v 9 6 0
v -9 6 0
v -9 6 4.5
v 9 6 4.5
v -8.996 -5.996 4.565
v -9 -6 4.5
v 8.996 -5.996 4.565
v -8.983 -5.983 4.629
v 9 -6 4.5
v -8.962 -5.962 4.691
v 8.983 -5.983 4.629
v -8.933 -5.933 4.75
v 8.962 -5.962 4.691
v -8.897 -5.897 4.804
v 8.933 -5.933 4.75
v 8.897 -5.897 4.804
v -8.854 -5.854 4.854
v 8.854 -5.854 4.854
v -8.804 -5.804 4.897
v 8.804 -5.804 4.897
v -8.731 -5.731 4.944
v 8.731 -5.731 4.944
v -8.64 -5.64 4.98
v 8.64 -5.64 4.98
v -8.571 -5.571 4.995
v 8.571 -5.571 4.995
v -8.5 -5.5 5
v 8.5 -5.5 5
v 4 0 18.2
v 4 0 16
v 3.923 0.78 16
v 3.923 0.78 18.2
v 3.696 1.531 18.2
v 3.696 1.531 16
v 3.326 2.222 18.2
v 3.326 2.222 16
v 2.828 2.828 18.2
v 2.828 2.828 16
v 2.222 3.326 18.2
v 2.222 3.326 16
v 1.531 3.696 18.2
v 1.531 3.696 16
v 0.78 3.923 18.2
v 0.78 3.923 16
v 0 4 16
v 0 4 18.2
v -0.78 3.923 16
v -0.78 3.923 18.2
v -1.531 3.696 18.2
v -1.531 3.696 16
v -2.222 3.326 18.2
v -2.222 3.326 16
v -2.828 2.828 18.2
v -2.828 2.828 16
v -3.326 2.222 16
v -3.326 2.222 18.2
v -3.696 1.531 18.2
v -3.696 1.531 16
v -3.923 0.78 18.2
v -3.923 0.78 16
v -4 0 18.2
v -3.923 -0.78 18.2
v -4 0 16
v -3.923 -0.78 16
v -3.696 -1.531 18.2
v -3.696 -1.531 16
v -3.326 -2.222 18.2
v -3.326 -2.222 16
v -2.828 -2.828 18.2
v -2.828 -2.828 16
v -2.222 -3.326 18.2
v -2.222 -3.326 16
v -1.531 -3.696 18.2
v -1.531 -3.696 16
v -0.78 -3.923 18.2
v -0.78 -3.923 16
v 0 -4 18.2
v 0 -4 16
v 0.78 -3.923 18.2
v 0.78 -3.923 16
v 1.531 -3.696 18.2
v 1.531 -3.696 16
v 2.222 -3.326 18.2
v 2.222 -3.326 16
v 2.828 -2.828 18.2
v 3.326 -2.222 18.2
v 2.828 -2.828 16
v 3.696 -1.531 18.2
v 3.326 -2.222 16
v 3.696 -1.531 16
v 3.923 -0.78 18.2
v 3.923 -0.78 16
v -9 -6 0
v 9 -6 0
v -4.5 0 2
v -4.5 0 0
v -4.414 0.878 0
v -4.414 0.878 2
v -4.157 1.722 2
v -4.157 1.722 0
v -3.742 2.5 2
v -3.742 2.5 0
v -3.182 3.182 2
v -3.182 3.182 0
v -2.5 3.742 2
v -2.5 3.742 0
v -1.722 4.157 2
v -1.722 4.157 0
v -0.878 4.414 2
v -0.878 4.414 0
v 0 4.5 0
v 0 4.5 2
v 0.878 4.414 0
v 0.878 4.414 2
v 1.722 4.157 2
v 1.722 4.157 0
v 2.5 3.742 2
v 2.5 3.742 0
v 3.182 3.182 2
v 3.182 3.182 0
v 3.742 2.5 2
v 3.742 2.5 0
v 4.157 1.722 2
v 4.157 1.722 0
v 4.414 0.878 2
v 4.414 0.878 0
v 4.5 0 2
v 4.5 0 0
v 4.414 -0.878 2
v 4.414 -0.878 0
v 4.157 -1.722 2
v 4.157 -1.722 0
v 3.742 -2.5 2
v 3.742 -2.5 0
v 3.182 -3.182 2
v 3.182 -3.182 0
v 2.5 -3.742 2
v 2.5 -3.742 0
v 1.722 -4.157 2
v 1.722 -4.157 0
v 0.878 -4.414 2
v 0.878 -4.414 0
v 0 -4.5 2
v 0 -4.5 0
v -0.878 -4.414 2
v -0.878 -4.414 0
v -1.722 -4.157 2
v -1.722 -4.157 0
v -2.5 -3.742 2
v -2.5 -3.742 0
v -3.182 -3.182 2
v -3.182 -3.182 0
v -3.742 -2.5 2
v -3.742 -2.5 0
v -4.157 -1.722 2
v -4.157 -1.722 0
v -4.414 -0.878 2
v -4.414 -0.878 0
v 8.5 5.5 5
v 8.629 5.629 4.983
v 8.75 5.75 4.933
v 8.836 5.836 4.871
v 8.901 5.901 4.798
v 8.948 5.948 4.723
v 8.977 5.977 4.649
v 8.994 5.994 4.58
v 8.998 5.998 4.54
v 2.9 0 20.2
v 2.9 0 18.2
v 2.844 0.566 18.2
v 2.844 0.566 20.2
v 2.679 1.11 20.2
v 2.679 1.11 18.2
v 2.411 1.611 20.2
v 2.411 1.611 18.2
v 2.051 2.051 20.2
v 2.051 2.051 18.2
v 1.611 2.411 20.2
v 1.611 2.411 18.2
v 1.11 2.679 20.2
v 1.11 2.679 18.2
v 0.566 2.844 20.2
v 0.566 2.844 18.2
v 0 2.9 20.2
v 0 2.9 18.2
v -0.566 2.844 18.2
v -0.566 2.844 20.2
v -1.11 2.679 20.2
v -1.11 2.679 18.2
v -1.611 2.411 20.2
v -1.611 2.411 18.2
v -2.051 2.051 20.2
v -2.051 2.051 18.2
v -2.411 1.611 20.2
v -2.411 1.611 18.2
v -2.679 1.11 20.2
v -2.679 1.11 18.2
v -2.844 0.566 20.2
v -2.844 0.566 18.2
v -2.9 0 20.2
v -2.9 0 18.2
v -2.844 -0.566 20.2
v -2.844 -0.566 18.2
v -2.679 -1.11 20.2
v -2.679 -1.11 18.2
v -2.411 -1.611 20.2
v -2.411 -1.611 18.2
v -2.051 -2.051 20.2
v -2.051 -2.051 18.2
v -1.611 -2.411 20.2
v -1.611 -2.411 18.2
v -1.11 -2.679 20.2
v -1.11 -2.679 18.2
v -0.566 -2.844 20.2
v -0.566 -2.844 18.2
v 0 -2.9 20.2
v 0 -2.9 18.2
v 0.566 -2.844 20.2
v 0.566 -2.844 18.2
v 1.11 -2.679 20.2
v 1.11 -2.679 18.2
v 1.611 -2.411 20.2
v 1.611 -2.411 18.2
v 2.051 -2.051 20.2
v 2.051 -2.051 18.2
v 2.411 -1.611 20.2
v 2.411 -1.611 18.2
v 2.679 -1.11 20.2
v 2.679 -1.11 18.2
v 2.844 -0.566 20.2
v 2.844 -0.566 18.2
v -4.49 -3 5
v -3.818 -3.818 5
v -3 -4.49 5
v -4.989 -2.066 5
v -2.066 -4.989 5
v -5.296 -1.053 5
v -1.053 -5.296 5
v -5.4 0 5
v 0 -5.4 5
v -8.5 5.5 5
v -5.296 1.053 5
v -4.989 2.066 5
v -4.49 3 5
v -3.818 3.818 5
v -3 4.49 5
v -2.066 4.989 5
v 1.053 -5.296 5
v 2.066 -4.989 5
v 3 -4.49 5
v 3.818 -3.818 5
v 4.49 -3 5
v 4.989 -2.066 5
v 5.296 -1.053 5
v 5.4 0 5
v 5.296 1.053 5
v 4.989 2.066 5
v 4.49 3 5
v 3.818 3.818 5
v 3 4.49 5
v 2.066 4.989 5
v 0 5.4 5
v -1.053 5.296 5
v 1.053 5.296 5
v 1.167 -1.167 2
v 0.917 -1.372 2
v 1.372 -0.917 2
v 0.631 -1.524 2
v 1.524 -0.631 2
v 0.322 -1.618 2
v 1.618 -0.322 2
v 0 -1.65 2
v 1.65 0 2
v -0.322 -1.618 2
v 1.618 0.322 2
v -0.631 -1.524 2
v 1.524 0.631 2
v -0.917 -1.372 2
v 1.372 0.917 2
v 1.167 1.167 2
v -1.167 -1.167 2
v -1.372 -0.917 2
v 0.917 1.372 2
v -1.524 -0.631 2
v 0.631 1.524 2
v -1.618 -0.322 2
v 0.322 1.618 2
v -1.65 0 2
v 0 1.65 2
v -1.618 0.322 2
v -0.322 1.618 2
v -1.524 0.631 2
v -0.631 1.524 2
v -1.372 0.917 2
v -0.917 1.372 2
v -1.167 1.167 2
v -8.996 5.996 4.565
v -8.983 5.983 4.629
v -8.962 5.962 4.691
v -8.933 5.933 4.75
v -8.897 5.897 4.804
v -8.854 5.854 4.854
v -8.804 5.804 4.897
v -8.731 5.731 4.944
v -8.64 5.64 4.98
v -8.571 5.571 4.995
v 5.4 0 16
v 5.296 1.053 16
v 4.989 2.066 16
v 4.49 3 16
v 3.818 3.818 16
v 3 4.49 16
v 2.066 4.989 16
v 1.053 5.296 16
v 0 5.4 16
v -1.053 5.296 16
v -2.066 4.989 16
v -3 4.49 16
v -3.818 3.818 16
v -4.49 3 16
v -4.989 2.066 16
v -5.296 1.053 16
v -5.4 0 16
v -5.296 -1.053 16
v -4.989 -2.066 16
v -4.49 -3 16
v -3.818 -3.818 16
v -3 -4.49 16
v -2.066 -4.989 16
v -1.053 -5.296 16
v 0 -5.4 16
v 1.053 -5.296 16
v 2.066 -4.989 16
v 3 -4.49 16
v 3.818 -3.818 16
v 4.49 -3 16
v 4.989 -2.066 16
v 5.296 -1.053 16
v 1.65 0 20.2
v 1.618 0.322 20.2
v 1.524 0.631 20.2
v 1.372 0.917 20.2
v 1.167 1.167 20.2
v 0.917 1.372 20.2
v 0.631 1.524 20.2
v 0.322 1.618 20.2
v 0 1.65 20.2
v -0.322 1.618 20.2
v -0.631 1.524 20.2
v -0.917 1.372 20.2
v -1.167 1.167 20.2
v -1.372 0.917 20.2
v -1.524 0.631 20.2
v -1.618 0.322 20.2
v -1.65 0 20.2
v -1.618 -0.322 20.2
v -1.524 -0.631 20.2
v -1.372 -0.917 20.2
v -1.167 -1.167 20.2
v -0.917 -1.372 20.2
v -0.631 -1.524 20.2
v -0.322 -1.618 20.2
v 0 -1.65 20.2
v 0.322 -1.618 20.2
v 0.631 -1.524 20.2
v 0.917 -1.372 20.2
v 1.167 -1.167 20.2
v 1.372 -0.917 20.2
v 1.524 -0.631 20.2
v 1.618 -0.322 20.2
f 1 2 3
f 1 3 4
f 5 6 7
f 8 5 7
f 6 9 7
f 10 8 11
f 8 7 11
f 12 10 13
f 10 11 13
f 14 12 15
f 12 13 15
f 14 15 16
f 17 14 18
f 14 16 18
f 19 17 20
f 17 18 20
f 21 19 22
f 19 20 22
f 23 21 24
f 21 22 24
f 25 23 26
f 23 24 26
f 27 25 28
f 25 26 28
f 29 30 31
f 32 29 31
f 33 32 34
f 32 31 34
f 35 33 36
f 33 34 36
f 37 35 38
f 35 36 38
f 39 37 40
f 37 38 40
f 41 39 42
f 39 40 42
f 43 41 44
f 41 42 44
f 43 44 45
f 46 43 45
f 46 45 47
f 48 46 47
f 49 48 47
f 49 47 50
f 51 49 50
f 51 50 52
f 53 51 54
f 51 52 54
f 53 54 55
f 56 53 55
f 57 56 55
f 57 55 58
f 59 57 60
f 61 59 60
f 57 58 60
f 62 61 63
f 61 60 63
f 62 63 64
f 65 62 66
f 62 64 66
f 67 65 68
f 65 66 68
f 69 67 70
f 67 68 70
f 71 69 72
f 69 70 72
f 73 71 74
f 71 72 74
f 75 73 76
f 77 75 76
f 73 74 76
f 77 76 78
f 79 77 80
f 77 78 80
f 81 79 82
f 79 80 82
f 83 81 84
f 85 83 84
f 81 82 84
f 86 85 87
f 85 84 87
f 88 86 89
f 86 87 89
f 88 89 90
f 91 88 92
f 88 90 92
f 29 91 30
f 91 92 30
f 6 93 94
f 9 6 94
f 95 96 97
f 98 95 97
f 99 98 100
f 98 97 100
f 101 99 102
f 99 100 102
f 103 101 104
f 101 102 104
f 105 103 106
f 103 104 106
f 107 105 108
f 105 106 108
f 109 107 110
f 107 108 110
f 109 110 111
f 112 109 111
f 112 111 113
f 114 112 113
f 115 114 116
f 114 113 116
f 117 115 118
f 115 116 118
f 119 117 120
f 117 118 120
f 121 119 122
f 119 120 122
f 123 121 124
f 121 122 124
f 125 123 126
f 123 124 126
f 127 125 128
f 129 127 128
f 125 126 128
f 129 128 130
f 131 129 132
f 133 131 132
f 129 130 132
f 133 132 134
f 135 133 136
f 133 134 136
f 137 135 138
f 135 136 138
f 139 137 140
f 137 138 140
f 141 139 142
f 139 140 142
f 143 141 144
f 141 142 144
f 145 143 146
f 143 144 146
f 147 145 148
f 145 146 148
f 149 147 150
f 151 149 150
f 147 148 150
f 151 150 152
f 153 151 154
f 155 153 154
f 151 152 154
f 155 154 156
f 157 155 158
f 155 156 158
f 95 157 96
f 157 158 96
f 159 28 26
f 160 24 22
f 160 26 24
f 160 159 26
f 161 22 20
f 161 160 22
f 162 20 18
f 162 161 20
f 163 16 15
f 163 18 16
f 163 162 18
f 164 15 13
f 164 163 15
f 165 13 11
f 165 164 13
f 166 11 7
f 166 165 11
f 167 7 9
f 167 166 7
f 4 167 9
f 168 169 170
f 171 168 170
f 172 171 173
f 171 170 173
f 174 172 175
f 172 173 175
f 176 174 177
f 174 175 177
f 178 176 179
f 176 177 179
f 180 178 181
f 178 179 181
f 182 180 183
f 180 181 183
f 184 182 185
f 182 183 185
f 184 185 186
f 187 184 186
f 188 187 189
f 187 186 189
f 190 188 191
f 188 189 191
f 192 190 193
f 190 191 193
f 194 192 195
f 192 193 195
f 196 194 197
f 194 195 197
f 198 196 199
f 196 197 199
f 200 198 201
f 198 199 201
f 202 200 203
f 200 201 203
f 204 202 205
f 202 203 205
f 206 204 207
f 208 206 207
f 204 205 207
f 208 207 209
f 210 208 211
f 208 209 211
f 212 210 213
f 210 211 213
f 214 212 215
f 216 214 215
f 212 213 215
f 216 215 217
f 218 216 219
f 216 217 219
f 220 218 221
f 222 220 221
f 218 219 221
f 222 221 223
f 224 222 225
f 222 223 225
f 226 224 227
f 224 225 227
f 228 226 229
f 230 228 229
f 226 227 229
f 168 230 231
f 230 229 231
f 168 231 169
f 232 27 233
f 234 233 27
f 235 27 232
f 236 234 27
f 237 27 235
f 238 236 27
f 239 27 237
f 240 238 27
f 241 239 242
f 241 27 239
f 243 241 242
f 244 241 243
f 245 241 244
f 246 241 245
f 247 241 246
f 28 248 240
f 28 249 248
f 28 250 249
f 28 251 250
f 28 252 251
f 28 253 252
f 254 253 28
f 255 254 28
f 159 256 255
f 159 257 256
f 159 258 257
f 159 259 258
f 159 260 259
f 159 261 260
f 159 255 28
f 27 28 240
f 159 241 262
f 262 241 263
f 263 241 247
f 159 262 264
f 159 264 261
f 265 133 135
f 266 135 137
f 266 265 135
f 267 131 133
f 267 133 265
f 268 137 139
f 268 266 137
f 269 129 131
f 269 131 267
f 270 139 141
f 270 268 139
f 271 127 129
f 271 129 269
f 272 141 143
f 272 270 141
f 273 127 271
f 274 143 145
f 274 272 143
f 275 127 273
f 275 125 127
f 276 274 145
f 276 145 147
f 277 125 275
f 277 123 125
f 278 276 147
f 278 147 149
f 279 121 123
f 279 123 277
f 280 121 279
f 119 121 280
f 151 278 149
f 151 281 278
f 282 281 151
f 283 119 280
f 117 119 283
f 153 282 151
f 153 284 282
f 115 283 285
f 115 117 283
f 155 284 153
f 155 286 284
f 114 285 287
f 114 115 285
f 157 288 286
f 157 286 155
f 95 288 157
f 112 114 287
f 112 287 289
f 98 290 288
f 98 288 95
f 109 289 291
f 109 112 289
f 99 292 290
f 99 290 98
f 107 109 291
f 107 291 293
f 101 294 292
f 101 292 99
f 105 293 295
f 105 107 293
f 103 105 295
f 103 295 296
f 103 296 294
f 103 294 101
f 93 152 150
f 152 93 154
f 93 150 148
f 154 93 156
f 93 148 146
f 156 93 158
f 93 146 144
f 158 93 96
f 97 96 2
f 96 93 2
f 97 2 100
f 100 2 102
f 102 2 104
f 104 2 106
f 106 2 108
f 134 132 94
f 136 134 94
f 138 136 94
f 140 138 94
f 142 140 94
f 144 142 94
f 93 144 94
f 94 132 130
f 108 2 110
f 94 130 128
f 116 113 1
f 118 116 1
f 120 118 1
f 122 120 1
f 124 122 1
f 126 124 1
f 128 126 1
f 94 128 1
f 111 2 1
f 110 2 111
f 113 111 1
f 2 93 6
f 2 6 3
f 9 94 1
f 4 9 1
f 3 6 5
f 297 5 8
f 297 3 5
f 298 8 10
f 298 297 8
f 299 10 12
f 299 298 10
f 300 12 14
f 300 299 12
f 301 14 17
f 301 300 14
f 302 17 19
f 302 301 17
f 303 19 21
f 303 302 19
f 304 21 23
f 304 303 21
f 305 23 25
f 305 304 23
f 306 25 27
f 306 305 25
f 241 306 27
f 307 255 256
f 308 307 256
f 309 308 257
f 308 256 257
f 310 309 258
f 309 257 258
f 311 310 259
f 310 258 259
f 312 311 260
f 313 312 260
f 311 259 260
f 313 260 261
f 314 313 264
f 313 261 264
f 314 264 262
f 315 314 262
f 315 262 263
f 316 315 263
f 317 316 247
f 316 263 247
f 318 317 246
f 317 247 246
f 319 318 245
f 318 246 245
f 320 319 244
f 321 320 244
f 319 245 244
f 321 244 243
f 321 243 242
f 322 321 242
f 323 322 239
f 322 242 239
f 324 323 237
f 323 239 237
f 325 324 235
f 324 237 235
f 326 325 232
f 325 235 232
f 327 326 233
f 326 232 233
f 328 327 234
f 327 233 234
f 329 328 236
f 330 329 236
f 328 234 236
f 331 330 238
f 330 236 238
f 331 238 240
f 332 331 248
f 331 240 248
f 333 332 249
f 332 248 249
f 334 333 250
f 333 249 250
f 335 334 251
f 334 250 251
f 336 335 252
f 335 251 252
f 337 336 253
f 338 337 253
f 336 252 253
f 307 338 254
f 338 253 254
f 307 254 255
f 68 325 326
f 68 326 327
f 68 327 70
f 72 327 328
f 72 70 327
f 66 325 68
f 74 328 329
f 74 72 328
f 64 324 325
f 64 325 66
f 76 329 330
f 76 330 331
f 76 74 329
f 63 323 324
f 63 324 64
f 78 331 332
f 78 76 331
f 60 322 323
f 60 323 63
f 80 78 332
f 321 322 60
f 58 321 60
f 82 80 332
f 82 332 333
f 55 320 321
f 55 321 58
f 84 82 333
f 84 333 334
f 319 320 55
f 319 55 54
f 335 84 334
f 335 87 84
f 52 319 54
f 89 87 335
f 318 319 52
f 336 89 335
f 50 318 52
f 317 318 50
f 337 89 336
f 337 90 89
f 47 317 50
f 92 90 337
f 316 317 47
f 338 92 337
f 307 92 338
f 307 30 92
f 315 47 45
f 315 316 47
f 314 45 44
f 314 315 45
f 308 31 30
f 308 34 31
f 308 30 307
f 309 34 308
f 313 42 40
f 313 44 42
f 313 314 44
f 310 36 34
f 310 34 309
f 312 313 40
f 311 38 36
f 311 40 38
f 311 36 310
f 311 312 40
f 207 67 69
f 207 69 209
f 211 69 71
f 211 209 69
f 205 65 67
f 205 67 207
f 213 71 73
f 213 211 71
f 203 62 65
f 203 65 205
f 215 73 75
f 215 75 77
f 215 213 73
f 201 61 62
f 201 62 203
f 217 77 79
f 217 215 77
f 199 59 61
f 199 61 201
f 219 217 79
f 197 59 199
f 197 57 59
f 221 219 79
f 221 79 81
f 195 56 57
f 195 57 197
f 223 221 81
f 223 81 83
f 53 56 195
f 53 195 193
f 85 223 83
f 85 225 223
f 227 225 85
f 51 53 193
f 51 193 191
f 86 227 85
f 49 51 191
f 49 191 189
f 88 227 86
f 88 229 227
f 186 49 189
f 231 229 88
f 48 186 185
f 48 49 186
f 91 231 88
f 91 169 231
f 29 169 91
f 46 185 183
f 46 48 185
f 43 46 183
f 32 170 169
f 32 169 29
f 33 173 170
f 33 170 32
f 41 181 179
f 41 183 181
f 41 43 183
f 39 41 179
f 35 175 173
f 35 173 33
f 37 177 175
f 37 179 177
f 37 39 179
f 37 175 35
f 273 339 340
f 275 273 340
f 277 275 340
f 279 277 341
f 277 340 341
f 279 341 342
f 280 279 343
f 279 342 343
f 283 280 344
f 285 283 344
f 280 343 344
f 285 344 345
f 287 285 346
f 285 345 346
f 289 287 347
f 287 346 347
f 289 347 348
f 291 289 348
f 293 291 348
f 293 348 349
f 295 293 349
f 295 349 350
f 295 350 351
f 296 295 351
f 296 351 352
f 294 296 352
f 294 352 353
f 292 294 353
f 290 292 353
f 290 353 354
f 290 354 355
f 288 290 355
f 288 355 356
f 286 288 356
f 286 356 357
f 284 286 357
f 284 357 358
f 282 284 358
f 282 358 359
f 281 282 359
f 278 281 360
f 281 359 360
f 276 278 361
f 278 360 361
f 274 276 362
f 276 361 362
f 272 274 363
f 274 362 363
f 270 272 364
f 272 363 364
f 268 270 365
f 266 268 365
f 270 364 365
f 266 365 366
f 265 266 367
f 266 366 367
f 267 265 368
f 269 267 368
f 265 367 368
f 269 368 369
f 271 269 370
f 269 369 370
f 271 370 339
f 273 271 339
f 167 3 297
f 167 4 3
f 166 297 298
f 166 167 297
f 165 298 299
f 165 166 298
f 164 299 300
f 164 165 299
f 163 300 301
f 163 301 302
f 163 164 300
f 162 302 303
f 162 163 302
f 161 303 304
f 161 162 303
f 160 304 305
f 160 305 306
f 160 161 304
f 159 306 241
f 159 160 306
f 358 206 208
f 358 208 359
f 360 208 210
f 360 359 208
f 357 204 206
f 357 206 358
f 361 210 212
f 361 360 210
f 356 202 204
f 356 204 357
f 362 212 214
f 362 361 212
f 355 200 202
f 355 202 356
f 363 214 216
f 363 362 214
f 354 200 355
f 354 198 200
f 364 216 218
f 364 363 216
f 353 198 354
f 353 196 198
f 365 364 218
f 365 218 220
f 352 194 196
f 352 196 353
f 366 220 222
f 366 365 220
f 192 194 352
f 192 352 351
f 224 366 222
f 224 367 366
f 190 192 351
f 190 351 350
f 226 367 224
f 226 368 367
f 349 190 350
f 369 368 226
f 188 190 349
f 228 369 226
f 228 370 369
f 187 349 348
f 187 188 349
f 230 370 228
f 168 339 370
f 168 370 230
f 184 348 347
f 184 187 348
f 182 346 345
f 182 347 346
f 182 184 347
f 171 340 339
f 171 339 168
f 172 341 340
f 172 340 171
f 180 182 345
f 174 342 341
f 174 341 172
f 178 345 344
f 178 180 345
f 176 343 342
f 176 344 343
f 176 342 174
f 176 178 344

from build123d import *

# Parameters (mm, degrees)
SKETCH_1_W          = 18
SKETCH_1_H          = 12
EXTRUDE_1_DEPTH     = 5
SKETCH_2_R          = 5.4
EXTRUDE_2_DEPTH     = 11
SKETCH_3_R          = 4
EXTRUDE_3_DEPTH     = 2.2
SKETCH_4_R          = 2.9
EXTRUDE_4_DEPTH     = 2
SKETCH_5_R          = 1.65
CUT_EXTRUDE_1_DEPTH = 25
SKETCH_6_R          = 4.5
CUT_EXTRUDE_2_DEPTH = 2
FILLET_1_R          = 0.5


with BuildPart() as part:
    # 草图1 → 凸台-拉伸1 (new body)
    with BuildSketch(Plane.XY):
        Rectangle(SKETCH_1_W, SKETCH_1_H)
    extrude(amount=EXTRUDE_1_DEPTH)

    # 草图2 → 凸台-拉伸2 (add)
    with BuildSketch(Plane.XY.offset(5)):
        Circle(SKETCH_2_R)
    extrude(amount=EXTRUDE_2_DEPTH)

    # 草图3 → 凸台-拉伸3 (add)
    with BuildSketch(Plane.XY.offset(16)):
        Circle(SKETCH_3_R)
    extrude(amount=EXTRUDE_3_DEPTH)

    # 草图4 → 凸台-拉伸4 (add)
    with BuildSketch(Plane.XY.offset(18.2)):
        Circle(SKETCH_4_R)
    extrude(amount=EXTRUDE_4_DEPTH)

    # 草图5 → 切除-拉伸1 (cut)
    with BuildSketch(Plane.XY.offset(20.2)):
        Circle(SKETCH_5_R)
    extrude(amount=-CUT_EXTRUDE_1_DEPTH, mode=Mode.SUBTRACT)

    # 草图6 → 切除-拉伸2 (cut)
    with BuildSketch(Plane(origin=(0, 0, 0), x_dir=(-1, 0, 0), z_dir=(0, 0, -1))):
        Circle(SKETCH_6_R)
    extrude(amount=-CUT_EXTRUDE_2_DEPTH, mode=Mode.SUBTRACT)

    # 圆角1
    fillet_1_edges = [part.edges().sort_by_distance(p)[0] for p in [
        (-9, 0, 5),
        (0, -6, 5),
        (9, 0, 5),
        (0, 6, 5),
    ]]
    fillet(fillet_1_edges, radius=FILLET_1_R)


solid = part.part
